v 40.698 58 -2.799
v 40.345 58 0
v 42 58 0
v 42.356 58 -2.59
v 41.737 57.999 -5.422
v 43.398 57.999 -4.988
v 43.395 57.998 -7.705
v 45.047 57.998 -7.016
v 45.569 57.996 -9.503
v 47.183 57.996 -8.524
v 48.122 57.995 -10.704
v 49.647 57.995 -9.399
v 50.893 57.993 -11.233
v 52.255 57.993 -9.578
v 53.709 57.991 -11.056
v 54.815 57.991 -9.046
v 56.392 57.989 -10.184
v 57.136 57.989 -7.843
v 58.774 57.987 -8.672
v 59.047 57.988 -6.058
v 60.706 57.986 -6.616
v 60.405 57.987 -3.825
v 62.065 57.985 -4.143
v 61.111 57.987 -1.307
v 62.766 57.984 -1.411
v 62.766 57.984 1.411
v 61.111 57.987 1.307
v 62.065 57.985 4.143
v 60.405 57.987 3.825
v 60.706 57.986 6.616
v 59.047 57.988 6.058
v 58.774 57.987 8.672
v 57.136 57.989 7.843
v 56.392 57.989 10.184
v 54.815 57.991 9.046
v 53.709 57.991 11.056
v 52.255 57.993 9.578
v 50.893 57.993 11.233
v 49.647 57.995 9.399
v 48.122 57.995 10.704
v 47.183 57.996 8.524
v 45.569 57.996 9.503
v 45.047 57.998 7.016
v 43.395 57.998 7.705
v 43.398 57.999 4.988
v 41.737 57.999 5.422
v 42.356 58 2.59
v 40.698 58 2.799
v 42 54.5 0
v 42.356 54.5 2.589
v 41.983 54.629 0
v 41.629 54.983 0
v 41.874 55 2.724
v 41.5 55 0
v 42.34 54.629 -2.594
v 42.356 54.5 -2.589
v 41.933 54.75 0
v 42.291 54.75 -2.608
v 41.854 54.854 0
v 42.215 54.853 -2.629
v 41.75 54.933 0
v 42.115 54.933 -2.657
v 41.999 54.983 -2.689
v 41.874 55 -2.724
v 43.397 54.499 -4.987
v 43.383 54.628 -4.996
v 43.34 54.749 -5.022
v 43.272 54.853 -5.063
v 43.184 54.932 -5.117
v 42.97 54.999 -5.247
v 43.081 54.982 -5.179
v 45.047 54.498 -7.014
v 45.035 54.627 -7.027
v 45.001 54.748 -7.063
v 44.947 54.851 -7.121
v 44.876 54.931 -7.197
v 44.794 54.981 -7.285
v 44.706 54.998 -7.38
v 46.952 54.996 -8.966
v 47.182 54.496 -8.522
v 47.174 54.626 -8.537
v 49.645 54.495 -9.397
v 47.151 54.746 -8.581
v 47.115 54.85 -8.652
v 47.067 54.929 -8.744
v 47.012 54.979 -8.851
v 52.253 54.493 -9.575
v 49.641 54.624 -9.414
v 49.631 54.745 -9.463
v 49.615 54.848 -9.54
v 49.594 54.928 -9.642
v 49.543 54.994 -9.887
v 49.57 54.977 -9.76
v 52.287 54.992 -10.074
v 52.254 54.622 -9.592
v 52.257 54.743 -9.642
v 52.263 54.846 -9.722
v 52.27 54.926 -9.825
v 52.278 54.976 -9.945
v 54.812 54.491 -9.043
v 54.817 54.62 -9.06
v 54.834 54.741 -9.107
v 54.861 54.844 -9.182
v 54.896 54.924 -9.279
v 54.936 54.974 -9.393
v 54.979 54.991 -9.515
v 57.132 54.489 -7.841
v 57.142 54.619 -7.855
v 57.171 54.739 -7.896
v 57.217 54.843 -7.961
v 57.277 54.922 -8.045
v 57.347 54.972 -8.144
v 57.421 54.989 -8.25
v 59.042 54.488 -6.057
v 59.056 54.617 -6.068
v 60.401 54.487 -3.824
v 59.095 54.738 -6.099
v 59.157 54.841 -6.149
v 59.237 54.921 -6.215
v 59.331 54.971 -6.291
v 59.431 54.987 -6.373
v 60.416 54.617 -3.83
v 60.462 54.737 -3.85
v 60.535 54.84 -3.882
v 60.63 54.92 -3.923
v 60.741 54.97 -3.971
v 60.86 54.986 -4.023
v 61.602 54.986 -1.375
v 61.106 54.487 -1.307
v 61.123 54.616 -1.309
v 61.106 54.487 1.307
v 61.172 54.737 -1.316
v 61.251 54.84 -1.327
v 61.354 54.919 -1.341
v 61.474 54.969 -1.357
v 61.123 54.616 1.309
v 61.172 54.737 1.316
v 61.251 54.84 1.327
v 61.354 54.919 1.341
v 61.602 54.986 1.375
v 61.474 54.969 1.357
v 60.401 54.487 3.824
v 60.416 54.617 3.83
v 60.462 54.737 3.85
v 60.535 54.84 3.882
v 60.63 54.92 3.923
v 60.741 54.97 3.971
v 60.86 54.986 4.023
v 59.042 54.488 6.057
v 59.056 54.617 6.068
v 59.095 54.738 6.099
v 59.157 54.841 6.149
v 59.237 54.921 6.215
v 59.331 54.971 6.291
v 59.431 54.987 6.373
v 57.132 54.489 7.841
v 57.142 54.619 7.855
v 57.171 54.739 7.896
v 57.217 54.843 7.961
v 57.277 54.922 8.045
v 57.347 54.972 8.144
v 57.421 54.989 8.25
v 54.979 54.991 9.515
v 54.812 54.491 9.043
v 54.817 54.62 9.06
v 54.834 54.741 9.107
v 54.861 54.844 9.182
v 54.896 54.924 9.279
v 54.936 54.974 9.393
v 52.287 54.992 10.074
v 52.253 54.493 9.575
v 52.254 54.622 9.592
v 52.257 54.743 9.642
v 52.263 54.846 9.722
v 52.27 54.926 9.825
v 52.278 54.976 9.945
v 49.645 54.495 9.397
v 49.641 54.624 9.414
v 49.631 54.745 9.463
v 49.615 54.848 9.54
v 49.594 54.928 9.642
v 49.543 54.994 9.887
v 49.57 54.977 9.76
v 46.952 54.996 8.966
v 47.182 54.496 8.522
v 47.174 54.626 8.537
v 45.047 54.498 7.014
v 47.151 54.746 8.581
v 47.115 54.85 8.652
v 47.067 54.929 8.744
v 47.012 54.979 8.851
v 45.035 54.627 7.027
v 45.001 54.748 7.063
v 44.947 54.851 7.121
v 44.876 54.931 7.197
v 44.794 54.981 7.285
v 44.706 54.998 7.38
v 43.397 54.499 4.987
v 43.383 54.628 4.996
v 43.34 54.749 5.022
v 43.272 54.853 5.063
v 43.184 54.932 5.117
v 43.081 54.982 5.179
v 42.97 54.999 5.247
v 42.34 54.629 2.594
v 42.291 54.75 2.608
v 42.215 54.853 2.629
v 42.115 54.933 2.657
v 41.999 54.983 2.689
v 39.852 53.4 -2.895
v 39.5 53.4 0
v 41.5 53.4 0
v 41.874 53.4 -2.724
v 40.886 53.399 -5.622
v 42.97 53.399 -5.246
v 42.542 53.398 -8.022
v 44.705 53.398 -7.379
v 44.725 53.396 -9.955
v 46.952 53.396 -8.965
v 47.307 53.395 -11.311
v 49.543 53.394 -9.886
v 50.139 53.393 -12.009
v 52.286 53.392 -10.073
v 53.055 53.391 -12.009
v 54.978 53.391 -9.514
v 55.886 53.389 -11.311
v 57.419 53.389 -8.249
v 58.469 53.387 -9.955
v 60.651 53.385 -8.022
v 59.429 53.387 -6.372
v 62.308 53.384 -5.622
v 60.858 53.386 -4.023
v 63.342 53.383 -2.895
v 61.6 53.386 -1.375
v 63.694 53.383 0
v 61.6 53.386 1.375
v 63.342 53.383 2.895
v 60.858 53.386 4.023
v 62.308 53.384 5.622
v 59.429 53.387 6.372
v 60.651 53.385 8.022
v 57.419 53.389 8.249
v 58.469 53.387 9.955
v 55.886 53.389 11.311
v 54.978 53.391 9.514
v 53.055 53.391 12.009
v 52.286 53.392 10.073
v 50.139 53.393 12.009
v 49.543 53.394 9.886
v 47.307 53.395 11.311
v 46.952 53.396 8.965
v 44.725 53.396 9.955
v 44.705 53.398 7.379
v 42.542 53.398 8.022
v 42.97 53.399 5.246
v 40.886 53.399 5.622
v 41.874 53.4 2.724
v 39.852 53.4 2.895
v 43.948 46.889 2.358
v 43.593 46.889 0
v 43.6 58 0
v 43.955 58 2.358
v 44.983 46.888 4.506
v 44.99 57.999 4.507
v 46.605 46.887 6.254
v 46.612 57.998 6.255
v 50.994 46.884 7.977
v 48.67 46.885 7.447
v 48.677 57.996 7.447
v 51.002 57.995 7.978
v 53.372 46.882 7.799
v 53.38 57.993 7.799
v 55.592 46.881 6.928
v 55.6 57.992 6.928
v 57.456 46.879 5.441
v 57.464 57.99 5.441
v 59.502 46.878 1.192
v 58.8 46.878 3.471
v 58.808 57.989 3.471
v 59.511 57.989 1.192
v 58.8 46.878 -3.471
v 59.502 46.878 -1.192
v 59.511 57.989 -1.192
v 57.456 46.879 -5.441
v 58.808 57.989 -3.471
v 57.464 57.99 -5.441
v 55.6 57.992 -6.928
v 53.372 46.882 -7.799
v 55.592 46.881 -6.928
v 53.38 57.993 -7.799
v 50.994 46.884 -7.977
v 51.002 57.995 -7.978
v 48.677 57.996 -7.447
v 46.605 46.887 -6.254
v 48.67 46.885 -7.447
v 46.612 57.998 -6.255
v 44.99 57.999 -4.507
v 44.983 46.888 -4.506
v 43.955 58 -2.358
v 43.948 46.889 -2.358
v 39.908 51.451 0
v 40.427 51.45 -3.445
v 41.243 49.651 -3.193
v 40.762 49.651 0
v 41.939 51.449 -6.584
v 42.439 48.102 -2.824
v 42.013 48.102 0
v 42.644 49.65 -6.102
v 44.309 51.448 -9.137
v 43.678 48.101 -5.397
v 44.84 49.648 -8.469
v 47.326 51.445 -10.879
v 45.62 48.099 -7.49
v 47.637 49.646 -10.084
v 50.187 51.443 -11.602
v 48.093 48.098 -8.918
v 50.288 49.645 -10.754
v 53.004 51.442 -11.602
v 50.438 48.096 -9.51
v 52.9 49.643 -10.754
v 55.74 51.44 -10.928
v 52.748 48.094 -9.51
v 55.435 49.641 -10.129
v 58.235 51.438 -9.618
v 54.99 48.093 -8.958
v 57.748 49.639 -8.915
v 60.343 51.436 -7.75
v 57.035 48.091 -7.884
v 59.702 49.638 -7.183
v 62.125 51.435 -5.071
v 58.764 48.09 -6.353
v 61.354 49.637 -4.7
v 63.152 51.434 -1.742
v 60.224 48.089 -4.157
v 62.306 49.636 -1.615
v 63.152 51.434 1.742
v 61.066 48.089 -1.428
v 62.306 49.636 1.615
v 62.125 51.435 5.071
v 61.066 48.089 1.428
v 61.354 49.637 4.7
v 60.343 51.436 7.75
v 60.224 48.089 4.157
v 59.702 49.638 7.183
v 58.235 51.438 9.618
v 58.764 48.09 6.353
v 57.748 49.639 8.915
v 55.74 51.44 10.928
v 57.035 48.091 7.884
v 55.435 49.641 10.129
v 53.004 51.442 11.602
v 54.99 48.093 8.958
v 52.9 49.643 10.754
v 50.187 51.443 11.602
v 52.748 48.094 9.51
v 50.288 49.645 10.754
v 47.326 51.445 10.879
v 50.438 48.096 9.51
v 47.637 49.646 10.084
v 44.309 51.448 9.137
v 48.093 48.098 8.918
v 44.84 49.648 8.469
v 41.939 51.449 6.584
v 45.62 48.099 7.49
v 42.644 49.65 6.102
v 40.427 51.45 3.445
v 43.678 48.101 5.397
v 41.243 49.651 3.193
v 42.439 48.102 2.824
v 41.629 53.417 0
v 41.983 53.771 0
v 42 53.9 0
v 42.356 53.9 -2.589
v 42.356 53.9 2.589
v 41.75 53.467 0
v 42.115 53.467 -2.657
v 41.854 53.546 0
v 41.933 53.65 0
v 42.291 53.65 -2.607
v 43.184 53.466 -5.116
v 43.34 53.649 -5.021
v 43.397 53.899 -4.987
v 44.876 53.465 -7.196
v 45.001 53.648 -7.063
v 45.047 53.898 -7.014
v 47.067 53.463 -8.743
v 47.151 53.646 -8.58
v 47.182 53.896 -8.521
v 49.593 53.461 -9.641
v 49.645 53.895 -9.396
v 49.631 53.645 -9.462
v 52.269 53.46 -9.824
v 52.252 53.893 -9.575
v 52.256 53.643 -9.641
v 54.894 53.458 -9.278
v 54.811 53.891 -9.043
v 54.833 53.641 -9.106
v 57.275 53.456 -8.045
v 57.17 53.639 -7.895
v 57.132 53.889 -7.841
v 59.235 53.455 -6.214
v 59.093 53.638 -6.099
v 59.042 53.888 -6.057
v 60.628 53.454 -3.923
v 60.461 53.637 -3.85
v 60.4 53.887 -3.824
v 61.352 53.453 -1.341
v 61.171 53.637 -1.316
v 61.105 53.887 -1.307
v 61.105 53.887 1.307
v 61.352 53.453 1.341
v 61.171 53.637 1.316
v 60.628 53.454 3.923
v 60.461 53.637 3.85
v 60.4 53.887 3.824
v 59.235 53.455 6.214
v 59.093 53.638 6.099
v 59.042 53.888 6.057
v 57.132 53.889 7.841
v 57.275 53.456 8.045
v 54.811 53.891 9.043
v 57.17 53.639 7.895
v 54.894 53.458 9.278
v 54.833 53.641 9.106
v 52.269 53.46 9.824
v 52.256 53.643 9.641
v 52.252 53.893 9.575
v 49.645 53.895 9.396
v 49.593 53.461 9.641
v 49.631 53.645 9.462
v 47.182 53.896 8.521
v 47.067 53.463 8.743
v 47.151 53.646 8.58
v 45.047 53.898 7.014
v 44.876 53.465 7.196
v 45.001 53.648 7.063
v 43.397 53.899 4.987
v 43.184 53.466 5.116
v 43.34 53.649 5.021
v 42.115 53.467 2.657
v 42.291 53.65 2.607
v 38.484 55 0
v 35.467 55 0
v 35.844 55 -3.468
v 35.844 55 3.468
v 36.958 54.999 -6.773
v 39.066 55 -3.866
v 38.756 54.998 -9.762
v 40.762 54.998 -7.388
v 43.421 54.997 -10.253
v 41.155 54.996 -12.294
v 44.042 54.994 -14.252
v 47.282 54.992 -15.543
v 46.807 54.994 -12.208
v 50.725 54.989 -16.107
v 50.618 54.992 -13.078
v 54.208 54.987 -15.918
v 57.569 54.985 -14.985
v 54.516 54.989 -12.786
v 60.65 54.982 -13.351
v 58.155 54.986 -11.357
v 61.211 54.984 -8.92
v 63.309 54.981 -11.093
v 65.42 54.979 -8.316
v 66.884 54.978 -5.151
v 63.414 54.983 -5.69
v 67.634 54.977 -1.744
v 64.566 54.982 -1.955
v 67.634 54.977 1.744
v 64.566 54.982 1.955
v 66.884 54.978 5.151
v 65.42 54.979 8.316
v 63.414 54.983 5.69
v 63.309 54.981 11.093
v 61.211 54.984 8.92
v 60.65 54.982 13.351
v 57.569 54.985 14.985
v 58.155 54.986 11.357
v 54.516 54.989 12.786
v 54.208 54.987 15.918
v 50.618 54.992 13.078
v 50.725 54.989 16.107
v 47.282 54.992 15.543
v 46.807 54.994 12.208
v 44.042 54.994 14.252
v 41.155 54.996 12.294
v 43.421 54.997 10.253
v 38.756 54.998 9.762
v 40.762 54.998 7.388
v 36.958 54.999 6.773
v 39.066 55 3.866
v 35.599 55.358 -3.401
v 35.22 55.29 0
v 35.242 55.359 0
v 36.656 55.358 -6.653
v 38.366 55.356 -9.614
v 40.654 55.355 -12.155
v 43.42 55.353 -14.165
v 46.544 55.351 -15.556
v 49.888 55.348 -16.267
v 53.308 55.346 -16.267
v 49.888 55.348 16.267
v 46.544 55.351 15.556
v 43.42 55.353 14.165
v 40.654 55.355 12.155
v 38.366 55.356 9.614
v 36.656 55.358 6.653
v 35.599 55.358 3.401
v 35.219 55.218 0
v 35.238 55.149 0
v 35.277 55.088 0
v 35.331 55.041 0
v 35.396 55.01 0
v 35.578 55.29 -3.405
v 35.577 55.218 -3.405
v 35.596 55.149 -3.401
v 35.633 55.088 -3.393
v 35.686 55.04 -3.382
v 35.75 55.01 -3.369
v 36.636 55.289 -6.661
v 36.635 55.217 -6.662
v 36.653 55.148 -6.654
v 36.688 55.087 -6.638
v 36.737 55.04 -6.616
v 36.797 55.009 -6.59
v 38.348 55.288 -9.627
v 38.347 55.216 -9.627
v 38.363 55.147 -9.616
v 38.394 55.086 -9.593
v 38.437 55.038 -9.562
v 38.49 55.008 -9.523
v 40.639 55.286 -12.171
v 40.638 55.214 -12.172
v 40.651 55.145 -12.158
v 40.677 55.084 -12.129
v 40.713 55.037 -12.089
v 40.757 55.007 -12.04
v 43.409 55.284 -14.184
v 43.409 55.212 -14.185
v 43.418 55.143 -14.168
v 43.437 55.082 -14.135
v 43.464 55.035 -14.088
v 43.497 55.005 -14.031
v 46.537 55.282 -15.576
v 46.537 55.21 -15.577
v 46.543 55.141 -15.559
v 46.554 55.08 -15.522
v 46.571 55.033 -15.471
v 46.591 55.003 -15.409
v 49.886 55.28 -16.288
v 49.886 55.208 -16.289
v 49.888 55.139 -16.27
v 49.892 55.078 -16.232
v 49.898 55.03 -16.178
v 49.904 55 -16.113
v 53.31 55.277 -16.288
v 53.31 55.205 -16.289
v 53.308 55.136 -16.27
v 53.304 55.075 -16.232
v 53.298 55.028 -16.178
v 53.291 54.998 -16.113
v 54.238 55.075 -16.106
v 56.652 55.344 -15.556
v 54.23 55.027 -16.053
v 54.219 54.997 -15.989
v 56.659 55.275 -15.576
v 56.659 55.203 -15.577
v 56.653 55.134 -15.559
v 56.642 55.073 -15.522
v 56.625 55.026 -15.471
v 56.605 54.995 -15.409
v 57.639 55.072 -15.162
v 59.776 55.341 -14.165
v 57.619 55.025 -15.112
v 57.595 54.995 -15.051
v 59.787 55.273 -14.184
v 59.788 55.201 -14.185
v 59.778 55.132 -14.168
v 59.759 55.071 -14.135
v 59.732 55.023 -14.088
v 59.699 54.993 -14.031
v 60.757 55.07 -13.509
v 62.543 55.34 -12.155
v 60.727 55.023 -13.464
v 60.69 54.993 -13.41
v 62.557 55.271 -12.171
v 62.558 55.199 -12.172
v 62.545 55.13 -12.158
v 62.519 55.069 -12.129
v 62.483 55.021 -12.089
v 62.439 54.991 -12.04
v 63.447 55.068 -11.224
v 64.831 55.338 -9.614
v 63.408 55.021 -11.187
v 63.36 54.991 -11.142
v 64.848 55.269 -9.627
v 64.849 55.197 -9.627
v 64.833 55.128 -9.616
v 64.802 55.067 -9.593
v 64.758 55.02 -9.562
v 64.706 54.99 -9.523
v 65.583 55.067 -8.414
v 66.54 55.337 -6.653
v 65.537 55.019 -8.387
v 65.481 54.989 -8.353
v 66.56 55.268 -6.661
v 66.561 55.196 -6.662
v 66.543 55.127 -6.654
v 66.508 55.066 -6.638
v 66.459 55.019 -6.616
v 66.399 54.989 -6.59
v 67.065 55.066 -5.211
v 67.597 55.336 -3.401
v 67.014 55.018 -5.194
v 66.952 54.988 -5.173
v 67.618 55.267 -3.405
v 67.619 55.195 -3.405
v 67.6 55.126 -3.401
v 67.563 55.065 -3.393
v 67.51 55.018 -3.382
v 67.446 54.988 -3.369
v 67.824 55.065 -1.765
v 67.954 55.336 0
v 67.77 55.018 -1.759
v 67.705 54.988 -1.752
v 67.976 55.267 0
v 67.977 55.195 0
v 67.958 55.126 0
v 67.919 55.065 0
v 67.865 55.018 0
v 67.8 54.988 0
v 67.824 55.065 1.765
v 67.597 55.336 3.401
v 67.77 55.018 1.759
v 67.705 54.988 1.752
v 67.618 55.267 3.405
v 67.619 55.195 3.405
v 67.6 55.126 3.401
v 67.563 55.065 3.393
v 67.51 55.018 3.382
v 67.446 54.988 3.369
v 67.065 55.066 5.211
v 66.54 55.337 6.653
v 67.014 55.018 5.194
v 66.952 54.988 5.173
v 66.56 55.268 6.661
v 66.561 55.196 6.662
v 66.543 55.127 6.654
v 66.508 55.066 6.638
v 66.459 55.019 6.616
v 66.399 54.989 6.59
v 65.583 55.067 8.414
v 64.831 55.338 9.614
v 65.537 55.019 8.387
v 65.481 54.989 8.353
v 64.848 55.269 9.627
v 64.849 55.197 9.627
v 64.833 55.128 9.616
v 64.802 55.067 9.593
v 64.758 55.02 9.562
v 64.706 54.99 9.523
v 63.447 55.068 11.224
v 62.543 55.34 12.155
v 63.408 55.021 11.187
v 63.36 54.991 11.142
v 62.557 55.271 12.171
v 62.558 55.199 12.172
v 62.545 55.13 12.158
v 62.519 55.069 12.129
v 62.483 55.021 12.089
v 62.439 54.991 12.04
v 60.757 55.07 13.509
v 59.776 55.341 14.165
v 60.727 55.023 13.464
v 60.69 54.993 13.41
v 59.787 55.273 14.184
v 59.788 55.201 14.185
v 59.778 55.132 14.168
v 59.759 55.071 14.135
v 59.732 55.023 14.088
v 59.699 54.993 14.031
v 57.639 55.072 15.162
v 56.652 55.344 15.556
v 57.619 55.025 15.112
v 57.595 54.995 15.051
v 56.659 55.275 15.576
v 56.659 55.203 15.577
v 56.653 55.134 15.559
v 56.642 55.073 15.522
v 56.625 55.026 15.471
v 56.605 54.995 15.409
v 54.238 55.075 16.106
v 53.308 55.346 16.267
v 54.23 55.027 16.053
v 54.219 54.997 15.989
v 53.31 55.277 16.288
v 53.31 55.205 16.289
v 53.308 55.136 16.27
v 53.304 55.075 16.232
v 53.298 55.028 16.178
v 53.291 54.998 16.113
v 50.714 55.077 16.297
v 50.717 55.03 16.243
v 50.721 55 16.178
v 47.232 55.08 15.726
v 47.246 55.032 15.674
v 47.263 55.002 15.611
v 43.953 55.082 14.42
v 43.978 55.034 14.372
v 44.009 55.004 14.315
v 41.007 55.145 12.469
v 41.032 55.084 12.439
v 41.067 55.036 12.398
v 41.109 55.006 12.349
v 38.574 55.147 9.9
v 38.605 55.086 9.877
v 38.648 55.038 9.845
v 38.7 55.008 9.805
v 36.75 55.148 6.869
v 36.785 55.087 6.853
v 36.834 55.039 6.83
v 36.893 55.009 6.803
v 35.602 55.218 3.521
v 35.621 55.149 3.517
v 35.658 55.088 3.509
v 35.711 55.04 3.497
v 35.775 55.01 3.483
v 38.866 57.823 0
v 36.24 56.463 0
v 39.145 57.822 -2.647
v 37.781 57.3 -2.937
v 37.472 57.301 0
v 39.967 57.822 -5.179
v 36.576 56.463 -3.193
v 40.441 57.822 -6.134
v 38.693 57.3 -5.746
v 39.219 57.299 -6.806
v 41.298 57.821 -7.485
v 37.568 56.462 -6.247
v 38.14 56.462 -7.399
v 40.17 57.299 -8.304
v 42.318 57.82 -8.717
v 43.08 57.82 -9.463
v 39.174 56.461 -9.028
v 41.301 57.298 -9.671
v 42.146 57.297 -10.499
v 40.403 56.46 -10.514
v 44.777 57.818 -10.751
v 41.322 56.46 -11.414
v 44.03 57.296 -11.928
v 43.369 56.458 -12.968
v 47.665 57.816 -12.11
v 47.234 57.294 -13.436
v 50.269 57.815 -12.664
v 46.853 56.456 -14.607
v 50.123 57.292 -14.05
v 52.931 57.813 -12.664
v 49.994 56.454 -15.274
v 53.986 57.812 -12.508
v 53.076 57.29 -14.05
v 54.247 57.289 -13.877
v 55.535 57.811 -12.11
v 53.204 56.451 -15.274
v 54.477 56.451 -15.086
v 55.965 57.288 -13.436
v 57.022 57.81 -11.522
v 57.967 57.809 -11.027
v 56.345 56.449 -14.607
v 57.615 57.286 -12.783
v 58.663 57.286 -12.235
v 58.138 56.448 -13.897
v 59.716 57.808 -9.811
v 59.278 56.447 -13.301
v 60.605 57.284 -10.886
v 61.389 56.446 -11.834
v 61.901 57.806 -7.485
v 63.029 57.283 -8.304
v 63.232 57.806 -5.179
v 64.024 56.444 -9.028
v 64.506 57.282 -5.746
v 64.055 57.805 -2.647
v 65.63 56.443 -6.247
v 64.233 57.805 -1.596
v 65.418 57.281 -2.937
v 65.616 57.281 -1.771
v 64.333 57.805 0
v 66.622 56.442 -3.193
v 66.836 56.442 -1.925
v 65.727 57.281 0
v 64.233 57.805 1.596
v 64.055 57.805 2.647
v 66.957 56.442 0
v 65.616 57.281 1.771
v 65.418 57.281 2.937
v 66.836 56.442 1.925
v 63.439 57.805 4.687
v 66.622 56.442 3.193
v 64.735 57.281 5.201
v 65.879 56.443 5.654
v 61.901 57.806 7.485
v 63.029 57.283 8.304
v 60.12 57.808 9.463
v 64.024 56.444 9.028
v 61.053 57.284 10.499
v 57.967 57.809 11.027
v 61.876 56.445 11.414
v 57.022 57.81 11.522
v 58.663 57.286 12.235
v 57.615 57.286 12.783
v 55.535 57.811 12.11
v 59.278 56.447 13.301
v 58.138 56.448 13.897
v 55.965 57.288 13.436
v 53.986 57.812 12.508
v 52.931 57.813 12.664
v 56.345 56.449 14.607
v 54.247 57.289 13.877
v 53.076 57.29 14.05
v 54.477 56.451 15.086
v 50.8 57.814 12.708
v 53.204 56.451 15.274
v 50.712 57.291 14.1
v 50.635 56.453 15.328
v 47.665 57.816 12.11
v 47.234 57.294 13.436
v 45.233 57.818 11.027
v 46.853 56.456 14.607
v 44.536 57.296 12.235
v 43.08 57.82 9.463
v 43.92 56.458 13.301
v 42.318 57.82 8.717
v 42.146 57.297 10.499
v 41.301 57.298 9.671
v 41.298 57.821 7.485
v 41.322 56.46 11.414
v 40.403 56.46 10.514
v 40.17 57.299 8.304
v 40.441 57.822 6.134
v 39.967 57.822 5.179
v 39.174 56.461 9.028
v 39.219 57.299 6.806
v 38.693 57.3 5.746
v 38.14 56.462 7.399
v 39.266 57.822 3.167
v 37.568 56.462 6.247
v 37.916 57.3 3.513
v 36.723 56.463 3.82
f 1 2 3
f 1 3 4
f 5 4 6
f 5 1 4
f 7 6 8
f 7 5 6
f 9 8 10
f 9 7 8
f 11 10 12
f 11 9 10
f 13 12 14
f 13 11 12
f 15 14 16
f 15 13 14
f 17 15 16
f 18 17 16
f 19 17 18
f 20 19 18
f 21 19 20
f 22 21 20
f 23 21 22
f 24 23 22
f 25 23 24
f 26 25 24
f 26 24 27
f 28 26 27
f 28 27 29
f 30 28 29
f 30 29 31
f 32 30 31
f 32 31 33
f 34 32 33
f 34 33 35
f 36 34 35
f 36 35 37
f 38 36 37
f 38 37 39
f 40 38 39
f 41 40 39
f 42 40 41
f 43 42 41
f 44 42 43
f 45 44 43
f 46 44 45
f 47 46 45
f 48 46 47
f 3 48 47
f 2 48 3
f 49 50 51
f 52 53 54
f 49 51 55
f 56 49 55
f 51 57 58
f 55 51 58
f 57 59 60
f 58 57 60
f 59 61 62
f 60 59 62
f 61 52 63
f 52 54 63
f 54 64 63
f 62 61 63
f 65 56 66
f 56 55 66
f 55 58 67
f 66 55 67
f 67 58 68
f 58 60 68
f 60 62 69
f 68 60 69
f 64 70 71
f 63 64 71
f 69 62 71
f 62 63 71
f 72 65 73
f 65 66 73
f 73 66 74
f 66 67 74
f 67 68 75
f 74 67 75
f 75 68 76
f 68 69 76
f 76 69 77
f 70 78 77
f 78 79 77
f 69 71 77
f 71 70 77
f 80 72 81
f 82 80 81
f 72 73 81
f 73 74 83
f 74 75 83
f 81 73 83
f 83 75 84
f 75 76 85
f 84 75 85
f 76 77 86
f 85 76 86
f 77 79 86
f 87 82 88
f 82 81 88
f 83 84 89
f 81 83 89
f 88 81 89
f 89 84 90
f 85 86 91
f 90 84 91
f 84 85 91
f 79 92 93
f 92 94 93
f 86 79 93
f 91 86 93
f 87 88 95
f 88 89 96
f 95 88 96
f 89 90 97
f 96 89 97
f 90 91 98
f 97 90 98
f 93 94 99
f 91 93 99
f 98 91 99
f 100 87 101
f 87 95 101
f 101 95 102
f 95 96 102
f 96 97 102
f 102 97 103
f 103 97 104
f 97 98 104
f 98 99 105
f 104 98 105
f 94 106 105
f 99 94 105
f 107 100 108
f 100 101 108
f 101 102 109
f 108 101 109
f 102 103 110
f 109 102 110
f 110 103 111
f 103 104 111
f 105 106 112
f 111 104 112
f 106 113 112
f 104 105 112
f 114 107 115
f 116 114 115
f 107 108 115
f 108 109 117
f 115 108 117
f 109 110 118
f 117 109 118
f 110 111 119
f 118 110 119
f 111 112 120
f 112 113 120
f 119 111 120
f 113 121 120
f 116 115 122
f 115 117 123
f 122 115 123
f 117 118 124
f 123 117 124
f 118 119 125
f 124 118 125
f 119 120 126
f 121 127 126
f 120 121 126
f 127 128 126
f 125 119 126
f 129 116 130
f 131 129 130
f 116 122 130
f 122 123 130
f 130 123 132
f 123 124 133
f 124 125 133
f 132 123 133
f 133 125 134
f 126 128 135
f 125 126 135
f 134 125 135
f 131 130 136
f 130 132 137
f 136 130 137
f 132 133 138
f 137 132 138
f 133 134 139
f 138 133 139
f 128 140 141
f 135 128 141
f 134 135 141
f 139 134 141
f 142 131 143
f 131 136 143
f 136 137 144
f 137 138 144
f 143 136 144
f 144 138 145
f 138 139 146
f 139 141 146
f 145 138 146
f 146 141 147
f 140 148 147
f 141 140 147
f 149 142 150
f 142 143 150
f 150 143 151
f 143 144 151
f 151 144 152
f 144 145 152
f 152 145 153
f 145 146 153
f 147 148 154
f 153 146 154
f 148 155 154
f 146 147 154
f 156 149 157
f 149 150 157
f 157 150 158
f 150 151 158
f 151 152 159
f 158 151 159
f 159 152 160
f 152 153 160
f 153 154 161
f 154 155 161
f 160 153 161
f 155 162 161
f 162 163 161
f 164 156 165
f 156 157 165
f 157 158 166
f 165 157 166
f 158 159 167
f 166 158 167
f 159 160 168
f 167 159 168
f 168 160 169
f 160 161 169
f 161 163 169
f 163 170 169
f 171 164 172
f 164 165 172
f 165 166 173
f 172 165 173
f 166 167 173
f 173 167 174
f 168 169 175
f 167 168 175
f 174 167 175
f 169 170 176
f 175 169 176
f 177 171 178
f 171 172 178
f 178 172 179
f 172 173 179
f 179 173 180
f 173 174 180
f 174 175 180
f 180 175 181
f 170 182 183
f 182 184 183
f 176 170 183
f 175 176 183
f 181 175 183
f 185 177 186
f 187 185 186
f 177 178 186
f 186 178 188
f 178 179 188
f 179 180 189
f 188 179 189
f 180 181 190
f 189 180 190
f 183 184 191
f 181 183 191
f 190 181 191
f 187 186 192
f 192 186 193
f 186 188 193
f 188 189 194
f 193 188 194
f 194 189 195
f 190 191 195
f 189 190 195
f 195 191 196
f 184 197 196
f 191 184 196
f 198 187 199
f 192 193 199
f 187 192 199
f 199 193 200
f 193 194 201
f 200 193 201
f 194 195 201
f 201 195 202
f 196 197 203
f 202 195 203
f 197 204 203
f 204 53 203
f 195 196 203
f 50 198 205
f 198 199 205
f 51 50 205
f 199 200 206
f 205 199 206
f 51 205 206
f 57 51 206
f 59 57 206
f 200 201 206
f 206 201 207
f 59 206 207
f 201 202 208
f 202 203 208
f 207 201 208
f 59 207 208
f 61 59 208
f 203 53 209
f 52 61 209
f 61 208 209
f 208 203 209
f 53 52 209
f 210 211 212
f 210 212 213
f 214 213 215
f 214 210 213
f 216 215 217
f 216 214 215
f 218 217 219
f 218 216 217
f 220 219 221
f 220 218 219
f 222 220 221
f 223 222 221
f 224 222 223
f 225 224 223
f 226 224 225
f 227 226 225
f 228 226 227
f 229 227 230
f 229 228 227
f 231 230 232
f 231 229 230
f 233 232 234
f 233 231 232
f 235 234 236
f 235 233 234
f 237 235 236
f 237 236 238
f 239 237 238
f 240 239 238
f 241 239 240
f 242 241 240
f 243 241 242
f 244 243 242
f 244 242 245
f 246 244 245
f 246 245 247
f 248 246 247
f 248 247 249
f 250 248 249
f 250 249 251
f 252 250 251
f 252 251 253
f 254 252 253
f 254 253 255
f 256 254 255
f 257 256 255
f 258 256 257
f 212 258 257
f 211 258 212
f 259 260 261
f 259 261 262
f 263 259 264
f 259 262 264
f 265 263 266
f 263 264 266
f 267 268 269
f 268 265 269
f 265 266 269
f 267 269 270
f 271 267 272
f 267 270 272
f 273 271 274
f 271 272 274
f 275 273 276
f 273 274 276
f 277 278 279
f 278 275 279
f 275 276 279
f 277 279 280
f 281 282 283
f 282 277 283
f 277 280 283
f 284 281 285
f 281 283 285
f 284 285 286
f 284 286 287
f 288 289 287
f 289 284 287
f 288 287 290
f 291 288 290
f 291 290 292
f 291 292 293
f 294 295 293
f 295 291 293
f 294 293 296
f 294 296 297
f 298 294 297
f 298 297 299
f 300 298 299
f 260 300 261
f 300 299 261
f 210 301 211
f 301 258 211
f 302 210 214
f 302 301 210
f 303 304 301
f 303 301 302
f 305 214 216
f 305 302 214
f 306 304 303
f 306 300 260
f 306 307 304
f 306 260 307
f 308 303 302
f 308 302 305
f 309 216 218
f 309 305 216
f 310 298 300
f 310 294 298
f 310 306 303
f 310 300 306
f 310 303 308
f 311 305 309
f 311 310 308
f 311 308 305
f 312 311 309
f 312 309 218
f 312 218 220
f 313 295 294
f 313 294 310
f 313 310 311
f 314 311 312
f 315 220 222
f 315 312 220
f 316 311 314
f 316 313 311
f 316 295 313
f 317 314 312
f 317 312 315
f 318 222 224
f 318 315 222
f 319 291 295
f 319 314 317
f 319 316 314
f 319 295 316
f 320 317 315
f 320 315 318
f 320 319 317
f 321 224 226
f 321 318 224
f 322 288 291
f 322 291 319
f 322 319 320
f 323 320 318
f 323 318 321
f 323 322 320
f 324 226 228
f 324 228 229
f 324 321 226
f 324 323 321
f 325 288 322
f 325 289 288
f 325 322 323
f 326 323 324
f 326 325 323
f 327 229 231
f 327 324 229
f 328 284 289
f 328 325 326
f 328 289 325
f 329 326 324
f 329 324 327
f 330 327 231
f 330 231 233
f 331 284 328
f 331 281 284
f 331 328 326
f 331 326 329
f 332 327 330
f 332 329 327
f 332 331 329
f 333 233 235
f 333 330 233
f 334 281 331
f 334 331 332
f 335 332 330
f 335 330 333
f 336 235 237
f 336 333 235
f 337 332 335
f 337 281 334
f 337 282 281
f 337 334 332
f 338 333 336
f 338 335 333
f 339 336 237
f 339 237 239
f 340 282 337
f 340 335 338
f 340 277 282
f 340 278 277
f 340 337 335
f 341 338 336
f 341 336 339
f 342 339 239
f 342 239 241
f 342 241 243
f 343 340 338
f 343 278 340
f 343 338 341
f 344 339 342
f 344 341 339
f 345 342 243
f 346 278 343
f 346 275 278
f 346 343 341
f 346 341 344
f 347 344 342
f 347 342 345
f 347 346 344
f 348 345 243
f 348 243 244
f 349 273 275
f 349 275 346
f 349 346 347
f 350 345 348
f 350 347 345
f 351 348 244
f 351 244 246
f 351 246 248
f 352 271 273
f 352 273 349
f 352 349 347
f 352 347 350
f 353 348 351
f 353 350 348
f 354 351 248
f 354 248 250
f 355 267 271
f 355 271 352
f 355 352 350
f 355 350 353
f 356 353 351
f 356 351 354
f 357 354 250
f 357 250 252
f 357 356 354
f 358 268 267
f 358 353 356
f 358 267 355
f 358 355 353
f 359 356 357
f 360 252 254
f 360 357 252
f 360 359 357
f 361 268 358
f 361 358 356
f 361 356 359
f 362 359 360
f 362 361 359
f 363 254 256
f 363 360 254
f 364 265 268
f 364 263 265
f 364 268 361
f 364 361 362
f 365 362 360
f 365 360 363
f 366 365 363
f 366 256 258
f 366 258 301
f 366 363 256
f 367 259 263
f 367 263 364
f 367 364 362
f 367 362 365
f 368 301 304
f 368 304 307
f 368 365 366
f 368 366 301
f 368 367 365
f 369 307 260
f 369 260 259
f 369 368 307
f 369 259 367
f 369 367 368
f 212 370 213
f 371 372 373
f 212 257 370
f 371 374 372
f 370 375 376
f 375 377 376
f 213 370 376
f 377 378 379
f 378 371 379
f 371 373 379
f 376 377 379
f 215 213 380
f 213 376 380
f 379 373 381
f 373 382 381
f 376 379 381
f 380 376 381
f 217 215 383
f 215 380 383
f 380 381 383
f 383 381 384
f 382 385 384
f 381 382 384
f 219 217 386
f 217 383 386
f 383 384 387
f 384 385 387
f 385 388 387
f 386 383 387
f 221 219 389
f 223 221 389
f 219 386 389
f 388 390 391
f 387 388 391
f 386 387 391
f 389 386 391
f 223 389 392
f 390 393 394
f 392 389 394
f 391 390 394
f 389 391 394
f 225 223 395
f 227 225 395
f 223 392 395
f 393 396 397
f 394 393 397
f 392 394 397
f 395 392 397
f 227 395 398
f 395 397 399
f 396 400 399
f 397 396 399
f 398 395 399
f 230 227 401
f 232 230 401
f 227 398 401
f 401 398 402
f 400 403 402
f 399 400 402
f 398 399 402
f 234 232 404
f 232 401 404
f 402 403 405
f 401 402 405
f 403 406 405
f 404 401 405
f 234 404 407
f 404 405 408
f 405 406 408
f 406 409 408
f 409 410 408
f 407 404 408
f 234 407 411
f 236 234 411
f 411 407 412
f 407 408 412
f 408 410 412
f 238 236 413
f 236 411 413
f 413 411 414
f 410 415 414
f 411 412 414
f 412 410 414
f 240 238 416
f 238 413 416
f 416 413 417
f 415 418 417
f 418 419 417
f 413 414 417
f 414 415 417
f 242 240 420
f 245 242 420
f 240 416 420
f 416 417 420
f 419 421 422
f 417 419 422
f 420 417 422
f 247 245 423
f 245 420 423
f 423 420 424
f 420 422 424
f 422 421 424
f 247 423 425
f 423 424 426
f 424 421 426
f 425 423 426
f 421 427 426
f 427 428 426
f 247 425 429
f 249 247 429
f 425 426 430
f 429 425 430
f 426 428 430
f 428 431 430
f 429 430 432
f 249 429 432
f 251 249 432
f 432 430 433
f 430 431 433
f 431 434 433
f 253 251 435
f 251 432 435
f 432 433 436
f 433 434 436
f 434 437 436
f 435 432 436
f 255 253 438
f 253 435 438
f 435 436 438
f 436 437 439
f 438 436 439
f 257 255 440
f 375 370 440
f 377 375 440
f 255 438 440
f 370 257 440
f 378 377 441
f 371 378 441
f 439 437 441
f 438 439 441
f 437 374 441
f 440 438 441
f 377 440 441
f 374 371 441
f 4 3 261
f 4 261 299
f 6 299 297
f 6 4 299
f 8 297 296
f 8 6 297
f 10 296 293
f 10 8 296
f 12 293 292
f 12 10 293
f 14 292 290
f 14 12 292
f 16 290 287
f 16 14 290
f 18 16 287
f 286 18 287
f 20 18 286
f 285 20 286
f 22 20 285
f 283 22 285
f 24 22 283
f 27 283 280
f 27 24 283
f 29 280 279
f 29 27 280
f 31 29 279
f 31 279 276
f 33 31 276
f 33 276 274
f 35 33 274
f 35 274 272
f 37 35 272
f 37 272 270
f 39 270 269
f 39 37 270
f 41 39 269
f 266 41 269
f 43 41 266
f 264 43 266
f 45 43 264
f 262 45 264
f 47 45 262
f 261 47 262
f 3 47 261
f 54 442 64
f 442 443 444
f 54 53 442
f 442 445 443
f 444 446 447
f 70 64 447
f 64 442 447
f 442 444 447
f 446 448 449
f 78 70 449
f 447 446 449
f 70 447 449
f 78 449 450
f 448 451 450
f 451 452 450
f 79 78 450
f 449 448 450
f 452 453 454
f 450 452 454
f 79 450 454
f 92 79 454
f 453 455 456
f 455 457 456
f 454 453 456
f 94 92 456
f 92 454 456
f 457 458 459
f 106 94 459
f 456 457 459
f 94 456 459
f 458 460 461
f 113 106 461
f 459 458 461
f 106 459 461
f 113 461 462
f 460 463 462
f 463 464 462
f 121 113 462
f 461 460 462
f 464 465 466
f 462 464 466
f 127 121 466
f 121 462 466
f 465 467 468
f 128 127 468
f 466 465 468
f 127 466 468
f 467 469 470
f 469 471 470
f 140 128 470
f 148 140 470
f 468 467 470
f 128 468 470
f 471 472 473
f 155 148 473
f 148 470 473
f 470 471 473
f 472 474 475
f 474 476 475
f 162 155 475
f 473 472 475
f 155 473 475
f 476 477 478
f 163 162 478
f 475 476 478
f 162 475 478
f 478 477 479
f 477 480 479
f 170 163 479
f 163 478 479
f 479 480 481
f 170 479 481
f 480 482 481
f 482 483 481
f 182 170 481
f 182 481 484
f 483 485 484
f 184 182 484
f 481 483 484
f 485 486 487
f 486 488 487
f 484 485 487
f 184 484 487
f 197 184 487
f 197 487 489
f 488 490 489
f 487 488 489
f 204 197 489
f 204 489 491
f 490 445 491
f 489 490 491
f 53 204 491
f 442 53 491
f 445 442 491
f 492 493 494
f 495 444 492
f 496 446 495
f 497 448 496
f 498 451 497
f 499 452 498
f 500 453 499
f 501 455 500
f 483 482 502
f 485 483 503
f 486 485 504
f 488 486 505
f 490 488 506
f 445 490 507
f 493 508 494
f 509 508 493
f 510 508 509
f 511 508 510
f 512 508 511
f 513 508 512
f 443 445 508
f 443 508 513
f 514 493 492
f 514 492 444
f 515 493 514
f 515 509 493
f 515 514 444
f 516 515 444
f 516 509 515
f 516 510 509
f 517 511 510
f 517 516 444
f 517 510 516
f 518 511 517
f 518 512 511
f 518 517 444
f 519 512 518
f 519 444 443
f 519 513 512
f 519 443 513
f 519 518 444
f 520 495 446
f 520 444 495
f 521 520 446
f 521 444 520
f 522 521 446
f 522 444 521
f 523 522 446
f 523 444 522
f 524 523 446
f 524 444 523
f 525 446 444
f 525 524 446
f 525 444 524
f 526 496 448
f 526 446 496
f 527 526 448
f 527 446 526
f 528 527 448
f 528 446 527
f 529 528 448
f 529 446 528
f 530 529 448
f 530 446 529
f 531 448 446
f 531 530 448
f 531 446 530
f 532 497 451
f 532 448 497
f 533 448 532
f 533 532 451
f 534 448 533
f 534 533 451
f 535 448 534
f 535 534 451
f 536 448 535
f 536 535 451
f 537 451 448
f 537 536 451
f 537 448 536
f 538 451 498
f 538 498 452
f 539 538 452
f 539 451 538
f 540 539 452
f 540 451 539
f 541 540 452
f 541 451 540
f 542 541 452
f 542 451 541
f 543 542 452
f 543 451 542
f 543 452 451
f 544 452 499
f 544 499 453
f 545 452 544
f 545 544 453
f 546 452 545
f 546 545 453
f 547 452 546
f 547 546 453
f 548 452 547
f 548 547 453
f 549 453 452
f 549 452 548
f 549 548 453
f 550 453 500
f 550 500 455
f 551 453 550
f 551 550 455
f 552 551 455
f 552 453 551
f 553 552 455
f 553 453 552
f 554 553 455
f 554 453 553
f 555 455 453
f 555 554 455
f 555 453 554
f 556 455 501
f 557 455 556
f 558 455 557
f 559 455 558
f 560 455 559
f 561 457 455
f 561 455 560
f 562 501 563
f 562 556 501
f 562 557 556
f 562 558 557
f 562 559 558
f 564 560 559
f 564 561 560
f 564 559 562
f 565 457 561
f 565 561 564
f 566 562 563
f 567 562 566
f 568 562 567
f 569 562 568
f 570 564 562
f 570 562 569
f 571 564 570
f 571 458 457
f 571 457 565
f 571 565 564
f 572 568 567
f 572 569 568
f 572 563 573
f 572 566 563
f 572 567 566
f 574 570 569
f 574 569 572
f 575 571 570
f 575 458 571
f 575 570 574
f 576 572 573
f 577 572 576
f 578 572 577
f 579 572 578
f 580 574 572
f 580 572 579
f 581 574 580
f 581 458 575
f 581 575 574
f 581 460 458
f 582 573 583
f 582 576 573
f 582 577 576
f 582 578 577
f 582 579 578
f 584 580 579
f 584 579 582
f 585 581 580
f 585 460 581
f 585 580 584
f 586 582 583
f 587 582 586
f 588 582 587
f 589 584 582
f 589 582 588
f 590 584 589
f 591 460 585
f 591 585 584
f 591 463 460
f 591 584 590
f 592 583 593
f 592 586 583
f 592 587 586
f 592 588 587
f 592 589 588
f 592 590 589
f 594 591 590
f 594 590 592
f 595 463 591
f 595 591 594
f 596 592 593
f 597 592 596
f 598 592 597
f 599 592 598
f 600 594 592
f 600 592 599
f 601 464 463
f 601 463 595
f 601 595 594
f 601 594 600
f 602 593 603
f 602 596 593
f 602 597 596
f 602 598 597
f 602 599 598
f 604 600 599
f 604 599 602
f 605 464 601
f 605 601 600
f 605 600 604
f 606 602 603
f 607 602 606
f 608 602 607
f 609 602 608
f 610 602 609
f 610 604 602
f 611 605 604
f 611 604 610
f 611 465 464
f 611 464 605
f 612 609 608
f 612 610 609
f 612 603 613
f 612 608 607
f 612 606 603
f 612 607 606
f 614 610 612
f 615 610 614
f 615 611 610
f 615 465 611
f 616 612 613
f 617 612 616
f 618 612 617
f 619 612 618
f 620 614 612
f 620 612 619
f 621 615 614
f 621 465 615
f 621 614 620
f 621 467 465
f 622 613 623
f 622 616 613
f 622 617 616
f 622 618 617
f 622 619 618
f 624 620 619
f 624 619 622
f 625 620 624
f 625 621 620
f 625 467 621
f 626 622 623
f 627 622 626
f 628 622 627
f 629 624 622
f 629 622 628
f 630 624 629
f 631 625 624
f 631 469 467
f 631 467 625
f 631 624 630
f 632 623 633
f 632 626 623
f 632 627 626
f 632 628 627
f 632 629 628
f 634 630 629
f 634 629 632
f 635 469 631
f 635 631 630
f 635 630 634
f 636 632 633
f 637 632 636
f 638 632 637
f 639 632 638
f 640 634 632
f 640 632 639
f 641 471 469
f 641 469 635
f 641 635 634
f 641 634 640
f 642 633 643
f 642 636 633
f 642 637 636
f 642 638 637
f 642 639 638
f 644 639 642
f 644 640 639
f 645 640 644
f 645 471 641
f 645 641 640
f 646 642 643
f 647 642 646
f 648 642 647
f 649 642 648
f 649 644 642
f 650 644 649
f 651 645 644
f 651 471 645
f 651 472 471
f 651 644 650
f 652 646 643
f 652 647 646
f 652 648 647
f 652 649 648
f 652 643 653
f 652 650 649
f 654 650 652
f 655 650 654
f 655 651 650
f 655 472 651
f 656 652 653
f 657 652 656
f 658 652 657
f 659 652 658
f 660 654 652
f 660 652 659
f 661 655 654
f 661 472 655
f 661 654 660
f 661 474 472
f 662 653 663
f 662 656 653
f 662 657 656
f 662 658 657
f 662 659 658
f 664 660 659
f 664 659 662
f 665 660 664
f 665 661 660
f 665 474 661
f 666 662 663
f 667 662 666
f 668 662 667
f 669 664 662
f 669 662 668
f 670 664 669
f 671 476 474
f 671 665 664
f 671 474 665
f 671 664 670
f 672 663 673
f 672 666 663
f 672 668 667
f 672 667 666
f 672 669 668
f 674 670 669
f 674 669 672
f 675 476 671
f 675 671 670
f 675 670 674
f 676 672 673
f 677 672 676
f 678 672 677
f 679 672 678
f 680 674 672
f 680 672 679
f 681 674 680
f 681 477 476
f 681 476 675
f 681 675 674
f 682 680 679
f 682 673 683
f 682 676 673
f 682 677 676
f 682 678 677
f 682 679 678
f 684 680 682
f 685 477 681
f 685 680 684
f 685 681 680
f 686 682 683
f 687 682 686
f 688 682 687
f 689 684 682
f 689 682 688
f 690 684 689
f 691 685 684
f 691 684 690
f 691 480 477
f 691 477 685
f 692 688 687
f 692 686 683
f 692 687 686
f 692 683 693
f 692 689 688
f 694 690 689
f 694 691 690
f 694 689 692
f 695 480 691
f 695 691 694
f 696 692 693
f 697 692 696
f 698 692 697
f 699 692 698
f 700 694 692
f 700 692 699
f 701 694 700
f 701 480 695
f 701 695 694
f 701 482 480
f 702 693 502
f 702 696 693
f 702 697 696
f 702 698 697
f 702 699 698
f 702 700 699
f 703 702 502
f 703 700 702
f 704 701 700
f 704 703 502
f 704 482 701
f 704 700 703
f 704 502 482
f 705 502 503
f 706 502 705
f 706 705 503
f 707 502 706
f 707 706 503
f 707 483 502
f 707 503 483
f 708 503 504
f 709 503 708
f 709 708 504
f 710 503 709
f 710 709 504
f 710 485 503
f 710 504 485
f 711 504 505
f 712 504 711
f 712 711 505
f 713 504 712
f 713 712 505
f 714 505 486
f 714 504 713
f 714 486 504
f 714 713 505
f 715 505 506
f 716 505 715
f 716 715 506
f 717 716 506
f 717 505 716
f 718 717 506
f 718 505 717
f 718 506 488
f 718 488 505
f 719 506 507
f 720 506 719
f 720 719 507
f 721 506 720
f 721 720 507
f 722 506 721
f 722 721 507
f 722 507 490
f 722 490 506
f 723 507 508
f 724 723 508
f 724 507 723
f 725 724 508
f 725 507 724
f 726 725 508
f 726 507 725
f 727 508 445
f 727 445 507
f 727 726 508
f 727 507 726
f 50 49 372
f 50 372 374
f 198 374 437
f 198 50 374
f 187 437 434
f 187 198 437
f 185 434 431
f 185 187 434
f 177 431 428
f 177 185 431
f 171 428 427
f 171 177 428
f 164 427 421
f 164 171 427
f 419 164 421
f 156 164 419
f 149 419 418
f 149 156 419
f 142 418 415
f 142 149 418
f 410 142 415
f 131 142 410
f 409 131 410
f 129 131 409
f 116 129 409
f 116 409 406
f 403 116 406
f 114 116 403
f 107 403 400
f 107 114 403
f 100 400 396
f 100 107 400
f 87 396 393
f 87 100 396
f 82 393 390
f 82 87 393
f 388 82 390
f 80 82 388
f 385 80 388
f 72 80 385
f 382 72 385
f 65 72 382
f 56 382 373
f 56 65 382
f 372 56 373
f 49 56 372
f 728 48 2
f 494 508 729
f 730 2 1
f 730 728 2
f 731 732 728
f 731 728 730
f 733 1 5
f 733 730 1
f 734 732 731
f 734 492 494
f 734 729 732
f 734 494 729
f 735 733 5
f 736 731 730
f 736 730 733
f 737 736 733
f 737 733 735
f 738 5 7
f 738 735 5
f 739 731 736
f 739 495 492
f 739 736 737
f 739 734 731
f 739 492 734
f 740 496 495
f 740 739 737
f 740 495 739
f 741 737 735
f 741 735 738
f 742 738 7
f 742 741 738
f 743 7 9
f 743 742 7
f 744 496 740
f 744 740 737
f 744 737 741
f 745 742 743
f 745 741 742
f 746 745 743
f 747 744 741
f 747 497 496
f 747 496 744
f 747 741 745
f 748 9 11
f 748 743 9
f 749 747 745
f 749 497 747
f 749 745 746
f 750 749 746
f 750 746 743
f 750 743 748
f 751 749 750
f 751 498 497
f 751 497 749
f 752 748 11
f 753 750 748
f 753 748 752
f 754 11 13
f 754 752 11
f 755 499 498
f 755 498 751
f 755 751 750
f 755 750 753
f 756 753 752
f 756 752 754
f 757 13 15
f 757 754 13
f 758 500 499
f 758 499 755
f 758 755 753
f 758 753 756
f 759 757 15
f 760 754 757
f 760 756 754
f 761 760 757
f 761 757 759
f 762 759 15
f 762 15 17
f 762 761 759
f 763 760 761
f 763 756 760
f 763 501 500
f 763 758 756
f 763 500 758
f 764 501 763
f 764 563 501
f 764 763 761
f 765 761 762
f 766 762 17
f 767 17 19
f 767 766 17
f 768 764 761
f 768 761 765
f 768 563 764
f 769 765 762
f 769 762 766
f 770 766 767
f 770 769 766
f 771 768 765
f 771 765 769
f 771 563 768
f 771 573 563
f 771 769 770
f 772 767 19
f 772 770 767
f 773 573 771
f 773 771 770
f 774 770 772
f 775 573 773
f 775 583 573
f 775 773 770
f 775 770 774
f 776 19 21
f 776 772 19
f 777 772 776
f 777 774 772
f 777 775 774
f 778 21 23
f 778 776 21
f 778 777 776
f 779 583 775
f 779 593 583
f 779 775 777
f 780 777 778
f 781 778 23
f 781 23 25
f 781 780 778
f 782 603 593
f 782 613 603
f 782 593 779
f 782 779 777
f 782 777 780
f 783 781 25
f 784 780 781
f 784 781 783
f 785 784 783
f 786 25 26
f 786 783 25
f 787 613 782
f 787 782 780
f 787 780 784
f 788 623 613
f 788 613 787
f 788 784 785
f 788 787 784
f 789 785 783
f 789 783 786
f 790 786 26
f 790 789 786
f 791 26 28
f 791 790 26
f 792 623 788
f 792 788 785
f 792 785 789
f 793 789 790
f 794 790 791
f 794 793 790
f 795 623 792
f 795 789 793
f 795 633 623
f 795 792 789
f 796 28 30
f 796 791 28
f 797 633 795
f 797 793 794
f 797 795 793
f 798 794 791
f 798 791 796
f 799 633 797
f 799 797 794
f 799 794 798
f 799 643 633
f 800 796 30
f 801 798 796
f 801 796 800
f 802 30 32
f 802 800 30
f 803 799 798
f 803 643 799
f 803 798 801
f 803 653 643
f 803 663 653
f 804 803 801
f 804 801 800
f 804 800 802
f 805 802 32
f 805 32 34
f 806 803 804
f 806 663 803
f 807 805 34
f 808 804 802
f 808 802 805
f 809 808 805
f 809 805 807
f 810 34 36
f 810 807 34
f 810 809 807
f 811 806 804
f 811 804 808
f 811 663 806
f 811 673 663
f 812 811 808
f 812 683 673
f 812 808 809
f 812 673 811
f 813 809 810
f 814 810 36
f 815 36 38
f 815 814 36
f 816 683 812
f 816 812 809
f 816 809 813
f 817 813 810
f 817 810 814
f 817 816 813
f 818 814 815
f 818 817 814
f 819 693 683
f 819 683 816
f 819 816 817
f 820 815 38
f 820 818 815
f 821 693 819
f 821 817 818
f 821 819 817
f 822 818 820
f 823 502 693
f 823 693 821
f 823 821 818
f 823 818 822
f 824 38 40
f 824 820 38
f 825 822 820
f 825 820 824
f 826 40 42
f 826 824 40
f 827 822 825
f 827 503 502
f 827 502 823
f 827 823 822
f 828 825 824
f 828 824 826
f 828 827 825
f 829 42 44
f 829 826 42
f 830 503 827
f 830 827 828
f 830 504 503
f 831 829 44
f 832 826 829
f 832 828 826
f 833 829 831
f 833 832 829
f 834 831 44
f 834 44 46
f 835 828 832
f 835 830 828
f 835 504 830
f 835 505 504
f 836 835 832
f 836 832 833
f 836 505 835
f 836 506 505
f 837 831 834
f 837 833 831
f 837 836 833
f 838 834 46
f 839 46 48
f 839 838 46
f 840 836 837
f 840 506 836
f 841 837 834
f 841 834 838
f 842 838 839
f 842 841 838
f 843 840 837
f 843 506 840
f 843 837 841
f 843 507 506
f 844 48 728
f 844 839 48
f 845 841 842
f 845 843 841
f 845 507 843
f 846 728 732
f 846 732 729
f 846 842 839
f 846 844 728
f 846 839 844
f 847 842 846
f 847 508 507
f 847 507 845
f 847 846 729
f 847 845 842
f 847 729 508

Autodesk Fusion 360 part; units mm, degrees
sketch "Sketch2" plane through (0, 0, 0) normal (0, 0, 1) x (1, 0, 0)
  line L0 (43.6, 58) -> (42, 58)
  line L1 (42, 58) -> (40.3449, 58)
  line L2 (35.1446, 55.2169) -> (35.2591, 55.3887)
  line L3 (35.4671, 55) -> (41.5, 55)
  line L4 (42, 54.5) -> (42, 53.9)
  line L5 (41.5, 53.4) -> (39.5, 53.4)
  line L6 (43.5926, 46.8889) -> (43.6, 58)
  arc A0 (39.5, 53.4) -> (43.5926, 46.8889) centre (47.9075, 54.1428) ccw
  arc A1 (42, 54.5) -> (41.5, 55) centre (41.5, 54.5) ccw
  arc A2 (41.5, 53.4) -> (42, 53.9) centre (41.5, 53.9) ccw
  arc A3 (40.3449, 58) -> (35.1446, 55.2169) centre (40.3449, 51.75) ccw
  arc A4 (35.2591, 55.3887) -> (35.4671, 55) centre (35.4671, 55.25) ccw
  line L7 (43.6, 58) -> (51.6, 57.9946)
  line L8 (51.6, 57.9946) -> (51.5972, 53.7744)
  point P0 (37, 58)
  dimension "d9" = 1.6
  dimension "d10" = 5
  dimension "d12" = 3
  dimension "d13" = 1.6
  dimension "d15" = 5
  dimension "d18" = 0.5
  dimension "d19" = 0.5
  dimension "d20" = 6.25
  dimension "d21" = 0.25
  dimension "d22" = 8
revolve "Revolve1" add sketch "Sketch2" angle 360 about axis through (51.6, 57.9946, 0) along (-0.0007, -1, 0) contours L0 L1 L3 L4 L5 L6 A0 A1 A2 A3 A4
